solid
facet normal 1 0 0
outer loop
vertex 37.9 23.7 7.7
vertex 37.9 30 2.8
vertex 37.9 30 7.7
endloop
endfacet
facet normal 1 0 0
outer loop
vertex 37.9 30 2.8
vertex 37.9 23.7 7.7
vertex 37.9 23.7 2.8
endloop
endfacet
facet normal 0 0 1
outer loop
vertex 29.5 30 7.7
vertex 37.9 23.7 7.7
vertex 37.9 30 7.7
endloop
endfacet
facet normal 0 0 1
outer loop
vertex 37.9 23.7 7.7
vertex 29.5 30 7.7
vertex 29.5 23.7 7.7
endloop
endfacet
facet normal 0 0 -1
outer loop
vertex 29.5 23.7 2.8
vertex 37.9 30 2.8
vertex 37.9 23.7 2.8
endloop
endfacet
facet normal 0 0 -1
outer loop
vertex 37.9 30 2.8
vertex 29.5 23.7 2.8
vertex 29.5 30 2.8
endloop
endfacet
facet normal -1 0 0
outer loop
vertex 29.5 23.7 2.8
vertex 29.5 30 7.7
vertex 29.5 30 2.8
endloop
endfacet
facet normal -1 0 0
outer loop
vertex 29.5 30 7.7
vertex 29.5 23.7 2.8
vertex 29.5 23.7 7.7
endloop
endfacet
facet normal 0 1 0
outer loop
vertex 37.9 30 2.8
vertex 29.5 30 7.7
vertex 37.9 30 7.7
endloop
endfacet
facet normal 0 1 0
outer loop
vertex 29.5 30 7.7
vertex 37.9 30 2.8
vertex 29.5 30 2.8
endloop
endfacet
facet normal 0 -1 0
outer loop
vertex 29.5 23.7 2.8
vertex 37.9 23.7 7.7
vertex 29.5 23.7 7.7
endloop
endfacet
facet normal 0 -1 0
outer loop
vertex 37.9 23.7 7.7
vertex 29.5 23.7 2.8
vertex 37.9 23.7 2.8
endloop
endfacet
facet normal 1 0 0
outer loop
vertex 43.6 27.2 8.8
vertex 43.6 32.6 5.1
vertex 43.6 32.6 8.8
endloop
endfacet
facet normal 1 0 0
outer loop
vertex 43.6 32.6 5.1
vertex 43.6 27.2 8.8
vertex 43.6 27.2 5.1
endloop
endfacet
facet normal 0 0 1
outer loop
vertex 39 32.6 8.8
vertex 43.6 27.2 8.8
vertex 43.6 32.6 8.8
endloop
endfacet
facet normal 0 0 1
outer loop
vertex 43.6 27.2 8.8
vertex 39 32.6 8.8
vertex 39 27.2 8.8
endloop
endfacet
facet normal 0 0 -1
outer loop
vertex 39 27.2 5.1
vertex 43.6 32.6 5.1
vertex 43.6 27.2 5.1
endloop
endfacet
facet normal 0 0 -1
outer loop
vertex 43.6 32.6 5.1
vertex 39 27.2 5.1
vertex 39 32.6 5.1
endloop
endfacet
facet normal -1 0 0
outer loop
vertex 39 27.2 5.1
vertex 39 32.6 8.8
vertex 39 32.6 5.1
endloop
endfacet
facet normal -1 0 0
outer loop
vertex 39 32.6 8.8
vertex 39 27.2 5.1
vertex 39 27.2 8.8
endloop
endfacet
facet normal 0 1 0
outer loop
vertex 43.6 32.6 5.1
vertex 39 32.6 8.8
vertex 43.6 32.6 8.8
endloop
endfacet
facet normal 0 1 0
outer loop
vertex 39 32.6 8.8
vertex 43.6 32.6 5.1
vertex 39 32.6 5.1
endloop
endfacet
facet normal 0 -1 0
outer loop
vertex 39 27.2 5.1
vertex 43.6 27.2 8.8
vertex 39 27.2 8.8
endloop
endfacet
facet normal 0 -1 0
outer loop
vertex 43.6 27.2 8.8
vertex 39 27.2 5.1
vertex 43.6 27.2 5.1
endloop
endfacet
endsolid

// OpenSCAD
union() {
  translate([29.5, 23.7, 2.8]) cube(size=[8.4,6.3,4.9], center=false);
  translate([39.0, 27.2, 5.1]) cube(size=[4.6,5.4,3.7], center=false);
}
